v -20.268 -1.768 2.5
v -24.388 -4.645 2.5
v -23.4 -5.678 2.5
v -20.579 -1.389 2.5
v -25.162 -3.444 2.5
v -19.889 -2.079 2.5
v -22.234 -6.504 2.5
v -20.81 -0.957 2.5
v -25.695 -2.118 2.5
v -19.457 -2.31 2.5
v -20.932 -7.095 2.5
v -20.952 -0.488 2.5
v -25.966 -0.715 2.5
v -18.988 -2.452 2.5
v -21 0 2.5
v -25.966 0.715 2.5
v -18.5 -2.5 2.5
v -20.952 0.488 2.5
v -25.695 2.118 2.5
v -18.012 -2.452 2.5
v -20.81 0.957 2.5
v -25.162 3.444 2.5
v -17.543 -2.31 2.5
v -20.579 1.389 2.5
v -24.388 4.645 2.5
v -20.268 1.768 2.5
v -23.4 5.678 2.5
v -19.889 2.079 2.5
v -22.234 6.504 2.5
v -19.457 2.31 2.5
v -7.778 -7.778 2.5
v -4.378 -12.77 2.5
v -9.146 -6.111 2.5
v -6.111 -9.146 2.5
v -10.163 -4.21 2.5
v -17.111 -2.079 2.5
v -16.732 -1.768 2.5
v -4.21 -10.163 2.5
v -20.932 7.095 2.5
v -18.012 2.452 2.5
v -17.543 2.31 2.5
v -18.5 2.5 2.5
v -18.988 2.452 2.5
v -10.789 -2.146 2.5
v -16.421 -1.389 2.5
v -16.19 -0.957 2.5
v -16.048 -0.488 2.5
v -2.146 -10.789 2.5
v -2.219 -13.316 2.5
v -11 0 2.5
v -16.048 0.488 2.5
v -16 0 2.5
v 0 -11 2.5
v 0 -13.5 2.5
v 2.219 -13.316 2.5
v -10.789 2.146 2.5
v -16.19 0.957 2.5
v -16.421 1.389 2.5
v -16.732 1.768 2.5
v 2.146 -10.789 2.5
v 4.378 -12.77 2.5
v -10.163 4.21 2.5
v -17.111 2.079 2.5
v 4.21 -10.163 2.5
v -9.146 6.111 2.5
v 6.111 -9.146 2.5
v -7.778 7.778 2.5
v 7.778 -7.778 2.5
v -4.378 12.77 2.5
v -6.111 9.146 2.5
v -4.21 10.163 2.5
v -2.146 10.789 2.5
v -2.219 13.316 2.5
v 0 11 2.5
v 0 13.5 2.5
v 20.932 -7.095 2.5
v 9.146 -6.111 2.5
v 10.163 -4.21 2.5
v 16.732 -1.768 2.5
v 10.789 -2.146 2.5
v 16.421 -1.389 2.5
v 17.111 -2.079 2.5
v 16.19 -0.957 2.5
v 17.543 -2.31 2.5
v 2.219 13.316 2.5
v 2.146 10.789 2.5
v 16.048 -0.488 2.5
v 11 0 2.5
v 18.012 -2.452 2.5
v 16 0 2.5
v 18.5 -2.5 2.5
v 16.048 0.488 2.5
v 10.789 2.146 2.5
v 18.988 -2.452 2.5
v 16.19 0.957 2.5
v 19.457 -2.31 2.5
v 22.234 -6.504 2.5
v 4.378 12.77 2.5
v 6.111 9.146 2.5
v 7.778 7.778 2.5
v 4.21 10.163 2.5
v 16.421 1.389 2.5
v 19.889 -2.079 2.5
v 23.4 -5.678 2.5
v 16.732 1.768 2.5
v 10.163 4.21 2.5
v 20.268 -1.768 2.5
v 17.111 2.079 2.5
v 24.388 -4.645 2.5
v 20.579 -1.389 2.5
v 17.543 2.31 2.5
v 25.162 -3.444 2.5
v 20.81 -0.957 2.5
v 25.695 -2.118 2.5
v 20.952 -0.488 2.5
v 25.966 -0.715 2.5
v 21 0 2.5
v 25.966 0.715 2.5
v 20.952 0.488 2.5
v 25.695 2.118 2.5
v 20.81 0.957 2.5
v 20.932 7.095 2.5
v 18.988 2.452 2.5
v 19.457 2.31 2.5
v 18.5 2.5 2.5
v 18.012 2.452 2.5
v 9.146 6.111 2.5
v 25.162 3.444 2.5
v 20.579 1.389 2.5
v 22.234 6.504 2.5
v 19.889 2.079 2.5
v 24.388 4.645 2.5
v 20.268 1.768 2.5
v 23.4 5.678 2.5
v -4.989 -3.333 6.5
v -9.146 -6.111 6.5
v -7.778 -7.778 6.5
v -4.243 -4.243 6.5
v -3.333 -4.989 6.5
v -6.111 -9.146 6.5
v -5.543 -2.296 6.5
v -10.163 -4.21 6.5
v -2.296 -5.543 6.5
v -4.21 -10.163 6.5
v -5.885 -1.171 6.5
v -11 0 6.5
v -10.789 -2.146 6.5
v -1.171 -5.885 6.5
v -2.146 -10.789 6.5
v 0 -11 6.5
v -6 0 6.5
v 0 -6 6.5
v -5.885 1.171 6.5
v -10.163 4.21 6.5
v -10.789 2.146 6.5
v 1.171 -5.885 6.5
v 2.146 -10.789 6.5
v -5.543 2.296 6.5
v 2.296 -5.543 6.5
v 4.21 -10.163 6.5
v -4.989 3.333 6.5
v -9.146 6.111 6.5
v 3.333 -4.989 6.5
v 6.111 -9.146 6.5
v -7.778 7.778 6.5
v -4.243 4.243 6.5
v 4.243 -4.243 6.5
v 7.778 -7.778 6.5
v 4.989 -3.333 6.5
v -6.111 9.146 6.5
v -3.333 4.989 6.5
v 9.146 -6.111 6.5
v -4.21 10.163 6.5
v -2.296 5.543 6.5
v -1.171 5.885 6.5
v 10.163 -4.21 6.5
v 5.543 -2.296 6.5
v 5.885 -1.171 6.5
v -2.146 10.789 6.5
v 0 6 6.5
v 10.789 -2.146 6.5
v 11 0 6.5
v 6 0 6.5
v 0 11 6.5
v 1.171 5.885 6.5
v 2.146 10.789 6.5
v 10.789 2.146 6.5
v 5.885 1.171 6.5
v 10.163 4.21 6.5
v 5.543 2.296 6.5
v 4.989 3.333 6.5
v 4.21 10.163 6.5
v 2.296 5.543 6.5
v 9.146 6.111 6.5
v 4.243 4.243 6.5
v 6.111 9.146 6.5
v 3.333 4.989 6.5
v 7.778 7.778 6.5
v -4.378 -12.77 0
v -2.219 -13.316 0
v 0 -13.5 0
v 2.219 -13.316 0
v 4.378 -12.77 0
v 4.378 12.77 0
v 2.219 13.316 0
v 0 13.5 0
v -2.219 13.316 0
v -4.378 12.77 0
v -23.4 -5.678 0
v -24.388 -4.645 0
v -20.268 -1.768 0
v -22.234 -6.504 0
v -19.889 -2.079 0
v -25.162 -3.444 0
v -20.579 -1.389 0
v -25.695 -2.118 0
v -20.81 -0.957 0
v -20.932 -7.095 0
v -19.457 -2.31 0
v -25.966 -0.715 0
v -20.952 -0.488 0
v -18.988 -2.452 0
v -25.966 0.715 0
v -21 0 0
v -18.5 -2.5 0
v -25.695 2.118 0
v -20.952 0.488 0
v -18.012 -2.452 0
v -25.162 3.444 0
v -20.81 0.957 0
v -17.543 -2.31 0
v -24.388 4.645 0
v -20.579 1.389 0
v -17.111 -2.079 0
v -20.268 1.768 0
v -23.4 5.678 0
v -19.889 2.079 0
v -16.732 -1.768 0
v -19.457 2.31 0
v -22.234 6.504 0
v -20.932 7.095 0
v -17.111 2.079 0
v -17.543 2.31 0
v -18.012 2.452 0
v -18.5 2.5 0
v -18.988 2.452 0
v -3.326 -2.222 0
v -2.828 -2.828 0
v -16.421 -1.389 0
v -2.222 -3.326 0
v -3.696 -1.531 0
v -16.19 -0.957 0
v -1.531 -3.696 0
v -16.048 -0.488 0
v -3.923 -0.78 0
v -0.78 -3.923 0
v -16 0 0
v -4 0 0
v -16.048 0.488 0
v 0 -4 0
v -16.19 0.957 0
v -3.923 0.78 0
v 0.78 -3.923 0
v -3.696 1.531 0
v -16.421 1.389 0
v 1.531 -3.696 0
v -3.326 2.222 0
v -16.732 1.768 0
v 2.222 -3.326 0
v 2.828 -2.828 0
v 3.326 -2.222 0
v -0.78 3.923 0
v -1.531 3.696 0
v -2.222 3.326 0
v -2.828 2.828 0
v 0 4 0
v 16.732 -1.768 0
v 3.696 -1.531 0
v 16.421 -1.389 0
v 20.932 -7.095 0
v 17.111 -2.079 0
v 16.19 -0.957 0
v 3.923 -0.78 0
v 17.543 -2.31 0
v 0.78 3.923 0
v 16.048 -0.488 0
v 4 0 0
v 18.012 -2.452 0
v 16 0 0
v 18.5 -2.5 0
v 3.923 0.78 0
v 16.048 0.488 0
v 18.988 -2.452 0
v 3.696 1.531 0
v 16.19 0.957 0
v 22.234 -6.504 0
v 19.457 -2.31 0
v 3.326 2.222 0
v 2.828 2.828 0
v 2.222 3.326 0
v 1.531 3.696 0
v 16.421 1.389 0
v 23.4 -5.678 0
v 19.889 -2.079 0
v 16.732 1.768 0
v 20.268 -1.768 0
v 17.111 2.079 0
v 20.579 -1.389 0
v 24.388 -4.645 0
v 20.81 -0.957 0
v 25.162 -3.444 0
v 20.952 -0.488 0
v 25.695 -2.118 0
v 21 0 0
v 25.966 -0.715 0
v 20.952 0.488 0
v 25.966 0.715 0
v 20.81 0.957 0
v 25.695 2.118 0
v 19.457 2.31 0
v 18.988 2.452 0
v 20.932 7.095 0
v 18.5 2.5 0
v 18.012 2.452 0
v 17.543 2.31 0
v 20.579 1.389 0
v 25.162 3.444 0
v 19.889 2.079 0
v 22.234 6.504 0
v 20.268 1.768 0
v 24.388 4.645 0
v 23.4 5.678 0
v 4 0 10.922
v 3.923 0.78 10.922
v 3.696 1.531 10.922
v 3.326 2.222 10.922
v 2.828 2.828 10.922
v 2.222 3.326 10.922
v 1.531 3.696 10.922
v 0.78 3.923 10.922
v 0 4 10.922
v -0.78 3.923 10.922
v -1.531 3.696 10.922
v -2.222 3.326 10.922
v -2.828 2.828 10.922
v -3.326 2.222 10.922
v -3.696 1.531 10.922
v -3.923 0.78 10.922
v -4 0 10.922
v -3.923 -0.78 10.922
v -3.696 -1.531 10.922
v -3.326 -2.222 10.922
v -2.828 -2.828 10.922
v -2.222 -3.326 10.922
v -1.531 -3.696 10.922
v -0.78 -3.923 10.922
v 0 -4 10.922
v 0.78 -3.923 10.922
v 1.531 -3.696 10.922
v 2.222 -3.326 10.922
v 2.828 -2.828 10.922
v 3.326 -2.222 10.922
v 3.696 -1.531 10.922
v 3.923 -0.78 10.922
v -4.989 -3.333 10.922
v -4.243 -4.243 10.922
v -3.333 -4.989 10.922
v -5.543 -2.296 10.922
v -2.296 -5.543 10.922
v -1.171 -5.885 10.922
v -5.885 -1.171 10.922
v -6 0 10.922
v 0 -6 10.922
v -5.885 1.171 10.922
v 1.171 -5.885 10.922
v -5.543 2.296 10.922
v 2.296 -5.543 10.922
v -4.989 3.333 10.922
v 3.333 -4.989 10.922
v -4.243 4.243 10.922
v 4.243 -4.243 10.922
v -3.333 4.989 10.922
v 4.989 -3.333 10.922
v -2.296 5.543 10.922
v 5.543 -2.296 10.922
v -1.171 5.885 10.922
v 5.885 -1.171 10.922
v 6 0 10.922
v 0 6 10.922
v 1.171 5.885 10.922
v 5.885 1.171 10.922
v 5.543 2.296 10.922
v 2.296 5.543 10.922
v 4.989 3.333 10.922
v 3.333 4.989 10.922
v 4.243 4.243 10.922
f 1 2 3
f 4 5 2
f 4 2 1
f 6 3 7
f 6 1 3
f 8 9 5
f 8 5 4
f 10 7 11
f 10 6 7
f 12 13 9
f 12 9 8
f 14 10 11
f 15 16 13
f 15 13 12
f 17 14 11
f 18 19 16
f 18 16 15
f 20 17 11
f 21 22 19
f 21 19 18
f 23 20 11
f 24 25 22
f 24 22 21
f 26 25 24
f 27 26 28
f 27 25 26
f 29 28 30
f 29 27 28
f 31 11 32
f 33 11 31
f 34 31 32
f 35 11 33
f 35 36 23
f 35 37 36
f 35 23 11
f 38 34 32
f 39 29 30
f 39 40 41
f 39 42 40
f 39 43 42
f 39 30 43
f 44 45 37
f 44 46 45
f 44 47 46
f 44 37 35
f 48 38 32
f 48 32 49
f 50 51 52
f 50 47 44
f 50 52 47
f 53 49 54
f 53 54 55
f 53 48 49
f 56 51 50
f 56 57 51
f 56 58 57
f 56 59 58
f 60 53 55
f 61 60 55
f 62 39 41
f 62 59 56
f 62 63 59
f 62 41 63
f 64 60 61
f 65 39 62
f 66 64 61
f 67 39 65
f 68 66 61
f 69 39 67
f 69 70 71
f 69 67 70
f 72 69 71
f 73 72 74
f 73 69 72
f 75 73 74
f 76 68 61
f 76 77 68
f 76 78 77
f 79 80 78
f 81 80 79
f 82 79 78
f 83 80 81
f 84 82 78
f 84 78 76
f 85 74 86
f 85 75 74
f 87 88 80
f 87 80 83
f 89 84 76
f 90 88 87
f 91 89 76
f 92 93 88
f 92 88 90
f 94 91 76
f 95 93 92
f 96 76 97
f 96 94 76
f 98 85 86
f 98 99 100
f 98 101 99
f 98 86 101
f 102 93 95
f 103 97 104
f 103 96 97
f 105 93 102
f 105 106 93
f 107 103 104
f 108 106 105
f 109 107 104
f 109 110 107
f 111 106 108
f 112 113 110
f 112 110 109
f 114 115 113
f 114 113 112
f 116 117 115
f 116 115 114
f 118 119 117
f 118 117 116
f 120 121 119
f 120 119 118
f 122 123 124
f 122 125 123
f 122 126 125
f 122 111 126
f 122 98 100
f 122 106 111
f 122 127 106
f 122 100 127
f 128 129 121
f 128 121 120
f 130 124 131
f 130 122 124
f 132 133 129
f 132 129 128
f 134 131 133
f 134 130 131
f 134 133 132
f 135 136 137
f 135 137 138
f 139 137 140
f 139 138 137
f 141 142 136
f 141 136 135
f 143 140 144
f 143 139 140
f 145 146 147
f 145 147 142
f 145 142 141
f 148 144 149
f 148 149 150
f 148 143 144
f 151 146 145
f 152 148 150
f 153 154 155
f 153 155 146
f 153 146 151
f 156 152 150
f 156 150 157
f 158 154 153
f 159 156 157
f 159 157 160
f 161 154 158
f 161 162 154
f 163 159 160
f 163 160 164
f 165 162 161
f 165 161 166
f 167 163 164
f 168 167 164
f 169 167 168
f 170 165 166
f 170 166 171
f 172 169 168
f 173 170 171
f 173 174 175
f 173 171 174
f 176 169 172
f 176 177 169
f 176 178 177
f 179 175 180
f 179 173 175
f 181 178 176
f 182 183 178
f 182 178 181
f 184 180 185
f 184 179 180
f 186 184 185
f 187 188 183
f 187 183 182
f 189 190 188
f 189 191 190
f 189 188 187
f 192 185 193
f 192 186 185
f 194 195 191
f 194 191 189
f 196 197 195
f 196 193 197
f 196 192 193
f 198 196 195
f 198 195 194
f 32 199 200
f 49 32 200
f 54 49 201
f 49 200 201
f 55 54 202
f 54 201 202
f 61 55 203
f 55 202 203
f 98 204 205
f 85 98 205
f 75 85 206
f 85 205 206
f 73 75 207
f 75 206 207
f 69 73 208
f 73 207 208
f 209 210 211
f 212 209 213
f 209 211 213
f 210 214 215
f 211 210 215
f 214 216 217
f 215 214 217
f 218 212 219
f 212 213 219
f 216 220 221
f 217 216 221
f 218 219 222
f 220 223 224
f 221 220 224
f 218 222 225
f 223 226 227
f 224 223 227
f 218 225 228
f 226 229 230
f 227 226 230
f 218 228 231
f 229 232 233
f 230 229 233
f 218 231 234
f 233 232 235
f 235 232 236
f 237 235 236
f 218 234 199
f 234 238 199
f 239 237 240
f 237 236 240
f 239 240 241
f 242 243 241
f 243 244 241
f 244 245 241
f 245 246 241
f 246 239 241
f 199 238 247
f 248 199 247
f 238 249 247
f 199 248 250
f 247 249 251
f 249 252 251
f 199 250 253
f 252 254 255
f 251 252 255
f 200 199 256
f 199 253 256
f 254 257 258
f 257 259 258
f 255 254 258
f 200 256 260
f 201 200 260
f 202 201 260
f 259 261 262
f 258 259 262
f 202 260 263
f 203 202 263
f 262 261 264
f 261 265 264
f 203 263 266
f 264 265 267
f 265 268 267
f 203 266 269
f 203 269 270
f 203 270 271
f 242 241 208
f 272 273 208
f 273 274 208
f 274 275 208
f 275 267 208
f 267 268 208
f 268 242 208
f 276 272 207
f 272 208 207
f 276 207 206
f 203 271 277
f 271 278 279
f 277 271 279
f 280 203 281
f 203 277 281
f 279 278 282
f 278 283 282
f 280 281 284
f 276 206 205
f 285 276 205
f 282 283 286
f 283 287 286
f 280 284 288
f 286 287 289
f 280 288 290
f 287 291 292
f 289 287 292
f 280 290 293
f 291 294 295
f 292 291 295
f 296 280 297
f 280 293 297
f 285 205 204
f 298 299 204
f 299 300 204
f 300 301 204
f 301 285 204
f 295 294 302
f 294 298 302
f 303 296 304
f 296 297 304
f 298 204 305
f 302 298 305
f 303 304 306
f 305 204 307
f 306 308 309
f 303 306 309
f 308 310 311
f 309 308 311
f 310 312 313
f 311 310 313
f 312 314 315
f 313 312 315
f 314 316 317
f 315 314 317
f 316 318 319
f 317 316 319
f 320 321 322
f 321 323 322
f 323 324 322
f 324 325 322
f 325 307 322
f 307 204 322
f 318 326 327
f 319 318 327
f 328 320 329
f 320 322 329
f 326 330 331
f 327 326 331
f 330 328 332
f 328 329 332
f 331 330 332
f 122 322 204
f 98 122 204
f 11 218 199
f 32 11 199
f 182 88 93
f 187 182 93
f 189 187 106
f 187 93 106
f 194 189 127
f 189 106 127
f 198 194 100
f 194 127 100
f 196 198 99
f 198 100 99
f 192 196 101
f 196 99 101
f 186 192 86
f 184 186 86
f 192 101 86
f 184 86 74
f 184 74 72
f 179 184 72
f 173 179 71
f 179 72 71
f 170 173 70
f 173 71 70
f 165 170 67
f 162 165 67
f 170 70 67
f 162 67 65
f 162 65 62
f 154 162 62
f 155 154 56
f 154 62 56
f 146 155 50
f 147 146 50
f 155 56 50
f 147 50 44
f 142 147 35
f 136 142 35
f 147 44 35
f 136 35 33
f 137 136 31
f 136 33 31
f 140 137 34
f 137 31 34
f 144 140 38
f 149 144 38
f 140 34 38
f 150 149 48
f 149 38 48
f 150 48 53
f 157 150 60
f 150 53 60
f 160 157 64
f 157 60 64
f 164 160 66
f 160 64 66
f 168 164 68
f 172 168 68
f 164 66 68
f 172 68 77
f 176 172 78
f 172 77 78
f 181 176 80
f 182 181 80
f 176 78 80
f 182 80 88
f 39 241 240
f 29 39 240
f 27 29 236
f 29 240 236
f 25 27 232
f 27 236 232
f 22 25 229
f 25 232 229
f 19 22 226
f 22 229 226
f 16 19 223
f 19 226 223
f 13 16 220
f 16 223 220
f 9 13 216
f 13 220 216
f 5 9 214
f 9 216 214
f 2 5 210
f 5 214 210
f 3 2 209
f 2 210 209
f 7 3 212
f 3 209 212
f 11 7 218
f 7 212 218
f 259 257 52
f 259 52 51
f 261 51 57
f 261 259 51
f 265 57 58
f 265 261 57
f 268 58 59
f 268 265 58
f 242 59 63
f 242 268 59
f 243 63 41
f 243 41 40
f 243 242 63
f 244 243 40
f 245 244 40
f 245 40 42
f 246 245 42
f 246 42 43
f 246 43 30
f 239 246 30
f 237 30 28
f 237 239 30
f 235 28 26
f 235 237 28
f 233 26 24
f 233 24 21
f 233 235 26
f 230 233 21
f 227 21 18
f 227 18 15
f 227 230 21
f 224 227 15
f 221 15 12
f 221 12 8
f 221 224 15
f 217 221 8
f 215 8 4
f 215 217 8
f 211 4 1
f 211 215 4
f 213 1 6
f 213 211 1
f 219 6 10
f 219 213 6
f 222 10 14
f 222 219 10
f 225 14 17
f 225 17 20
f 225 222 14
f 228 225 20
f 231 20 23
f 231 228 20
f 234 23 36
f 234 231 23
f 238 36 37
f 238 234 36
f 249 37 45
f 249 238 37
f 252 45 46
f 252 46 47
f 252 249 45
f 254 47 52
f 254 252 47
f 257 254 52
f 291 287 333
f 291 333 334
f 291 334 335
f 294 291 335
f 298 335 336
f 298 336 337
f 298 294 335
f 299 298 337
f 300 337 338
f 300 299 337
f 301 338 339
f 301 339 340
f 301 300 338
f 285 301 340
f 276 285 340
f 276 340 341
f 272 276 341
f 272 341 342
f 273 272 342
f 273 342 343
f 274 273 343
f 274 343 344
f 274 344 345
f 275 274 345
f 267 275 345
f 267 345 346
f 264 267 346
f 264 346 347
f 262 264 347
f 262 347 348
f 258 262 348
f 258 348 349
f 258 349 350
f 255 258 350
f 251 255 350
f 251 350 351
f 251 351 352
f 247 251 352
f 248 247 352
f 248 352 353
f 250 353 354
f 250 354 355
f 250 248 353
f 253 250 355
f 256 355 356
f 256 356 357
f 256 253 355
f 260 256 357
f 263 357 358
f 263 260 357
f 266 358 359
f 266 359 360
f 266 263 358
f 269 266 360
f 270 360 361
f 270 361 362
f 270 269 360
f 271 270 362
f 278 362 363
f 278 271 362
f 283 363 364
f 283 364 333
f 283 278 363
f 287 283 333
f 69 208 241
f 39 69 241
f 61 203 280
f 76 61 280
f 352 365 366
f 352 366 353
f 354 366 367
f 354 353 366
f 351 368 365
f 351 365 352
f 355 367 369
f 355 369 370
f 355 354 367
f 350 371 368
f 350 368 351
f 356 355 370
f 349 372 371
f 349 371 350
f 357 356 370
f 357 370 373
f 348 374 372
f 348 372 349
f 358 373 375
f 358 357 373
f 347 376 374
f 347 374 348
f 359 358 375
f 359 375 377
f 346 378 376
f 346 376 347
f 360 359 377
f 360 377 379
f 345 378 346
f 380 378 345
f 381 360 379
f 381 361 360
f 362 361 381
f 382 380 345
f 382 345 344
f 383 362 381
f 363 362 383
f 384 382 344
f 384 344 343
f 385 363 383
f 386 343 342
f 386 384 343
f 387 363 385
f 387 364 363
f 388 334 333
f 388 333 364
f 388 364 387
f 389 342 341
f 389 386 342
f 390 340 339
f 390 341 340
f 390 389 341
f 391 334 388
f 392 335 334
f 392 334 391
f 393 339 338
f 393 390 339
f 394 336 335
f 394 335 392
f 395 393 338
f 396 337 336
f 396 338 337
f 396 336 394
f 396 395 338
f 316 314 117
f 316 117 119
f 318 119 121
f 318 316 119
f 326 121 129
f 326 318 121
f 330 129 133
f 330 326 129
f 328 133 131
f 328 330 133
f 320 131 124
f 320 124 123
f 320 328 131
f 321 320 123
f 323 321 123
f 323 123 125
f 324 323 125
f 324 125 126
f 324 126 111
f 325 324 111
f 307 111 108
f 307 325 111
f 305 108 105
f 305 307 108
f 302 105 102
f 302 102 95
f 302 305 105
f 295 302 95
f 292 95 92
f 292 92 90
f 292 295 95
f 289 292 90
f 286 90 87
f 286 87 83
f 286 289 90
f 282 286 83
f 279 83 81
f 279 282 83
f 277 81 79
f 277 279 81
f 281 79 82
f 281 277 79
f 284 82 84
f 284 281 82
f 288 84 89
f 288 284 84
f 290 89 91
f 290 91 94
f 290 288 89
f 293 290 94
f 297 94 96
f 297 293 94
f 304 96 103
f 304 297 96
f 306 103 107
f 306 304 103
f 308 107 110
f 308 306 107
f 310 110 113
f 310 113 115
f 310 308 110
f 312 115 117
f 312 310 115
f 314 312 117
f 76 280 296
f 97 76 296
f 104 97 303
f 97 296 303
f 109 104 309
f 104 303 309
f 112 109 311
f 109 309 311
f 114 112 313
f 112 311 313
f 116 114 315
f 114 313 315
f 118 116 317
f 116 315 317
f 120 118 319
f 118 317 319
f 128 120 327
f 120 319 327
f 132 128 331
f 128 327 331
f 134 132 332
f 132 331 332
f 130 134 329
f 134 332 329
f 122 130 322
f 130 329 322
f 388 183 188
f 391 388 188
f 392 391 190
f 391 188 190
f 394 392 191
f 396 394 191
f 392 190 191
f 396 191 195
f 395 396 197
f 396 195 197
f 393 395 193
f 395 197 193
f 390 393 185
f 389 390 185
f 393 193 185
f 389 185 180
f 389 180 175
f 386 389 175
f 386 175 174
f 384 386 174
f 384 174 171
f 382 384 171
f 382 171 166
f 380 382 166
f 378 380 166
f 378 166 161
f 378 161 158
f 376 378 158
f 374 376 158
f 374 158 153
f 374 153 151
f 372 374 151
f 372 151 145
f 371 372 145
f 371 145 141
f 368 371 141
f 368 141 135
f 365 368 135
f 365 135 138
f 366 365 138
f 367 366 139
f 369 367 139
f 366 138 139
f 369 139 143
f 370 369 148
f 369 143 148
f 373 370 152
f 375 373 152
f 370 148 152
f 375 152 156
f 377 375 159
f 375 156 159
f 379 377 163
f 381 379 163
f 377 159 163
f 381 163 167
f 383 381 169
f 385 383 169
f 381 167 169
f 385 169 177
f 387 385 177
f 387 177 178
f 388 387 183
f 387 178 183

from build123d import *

# Parameters (mm, degrees)
SKETCH2_R           = 4
SKETCH2_R_2         = 2.5
BOSS_EXTRUDE1_DEPTH = 2.5
SKETCH3_R           = 6
SKETCH3_R_2         = 4
BOSS_EXTRUDE2_DEPTH = 10.922
SKETCH4_R           = 11
SKETCH4_R_2         = 6
BOSS_EXTRUDE3_DEPTH = 4


with BuildPart() as part:
    # Sketch2 → Boss-Extrude1 (new body)
    with BuildSketch(Plane.XY):
        with BuildLine():
            ThreePointArc((20.932432432, -7.094594595), (26, 0), (20.932432432, 7.094594595))
            Line((20.932432432, 7.094594595), (4.378378378, 12.77027027))
            ThreePointArc((4.378378378, 12.77027027), (0, 13.5), (-4.378378378, 12.77027027))
            Line((-4.378378378, 12.77027027), (-20.932432432, 7.094594595))
            ThreePointArc((-20.932432432, 7.094594595), (-26, 0), (-20.932432432, -7.094594595))
            Line((-20.932432432, -7.094594595), (-4.378378378, -12.77027027))
            ThreePointArc((-4.378378378, -12.77027027), (0, -13.5), (4.378378378, -12.77027027))
            Line((4.378378378, -12.77027027), (20.932432432, -7.094594595))
        make_face()
        Circle(SKETCH2_R, mode=Mode.SUBTRACT)
        with Locations((18.5, 0)):
            Circle(SKETCH2_R_2, mode=Mode.SUBTRACT)
        with Locations((-18.5, 0)):
            Circle(SKETCH2_R_2, mode=Mode.SUBTRACT)
    extrude(amount=BOSS_EXTRUDE1_DEPTH)

    # Sketch3 → Boss-Extrude2 (add)
    with BuildSketch(Plane.XY):
        Circle(SKETCH3_R)
        Circle(SKETCH3_R_2, mode=Mode.SUBTRACT)
    extrude(amount=BOSS_EXTRUDE2_DEPTH)

    # Sketch4 → Boss-Extrude3 (add)
    with BuildSketch(Plane.XY.offset(2.5)):
        Circle(SKETCH4_R)
        Circle(SKETCH4_R_2, mode=Mode.SUBTRACT)
    extrude(amount=BOSS_EXTRUDE3_DEPTH)


solid = part.part
